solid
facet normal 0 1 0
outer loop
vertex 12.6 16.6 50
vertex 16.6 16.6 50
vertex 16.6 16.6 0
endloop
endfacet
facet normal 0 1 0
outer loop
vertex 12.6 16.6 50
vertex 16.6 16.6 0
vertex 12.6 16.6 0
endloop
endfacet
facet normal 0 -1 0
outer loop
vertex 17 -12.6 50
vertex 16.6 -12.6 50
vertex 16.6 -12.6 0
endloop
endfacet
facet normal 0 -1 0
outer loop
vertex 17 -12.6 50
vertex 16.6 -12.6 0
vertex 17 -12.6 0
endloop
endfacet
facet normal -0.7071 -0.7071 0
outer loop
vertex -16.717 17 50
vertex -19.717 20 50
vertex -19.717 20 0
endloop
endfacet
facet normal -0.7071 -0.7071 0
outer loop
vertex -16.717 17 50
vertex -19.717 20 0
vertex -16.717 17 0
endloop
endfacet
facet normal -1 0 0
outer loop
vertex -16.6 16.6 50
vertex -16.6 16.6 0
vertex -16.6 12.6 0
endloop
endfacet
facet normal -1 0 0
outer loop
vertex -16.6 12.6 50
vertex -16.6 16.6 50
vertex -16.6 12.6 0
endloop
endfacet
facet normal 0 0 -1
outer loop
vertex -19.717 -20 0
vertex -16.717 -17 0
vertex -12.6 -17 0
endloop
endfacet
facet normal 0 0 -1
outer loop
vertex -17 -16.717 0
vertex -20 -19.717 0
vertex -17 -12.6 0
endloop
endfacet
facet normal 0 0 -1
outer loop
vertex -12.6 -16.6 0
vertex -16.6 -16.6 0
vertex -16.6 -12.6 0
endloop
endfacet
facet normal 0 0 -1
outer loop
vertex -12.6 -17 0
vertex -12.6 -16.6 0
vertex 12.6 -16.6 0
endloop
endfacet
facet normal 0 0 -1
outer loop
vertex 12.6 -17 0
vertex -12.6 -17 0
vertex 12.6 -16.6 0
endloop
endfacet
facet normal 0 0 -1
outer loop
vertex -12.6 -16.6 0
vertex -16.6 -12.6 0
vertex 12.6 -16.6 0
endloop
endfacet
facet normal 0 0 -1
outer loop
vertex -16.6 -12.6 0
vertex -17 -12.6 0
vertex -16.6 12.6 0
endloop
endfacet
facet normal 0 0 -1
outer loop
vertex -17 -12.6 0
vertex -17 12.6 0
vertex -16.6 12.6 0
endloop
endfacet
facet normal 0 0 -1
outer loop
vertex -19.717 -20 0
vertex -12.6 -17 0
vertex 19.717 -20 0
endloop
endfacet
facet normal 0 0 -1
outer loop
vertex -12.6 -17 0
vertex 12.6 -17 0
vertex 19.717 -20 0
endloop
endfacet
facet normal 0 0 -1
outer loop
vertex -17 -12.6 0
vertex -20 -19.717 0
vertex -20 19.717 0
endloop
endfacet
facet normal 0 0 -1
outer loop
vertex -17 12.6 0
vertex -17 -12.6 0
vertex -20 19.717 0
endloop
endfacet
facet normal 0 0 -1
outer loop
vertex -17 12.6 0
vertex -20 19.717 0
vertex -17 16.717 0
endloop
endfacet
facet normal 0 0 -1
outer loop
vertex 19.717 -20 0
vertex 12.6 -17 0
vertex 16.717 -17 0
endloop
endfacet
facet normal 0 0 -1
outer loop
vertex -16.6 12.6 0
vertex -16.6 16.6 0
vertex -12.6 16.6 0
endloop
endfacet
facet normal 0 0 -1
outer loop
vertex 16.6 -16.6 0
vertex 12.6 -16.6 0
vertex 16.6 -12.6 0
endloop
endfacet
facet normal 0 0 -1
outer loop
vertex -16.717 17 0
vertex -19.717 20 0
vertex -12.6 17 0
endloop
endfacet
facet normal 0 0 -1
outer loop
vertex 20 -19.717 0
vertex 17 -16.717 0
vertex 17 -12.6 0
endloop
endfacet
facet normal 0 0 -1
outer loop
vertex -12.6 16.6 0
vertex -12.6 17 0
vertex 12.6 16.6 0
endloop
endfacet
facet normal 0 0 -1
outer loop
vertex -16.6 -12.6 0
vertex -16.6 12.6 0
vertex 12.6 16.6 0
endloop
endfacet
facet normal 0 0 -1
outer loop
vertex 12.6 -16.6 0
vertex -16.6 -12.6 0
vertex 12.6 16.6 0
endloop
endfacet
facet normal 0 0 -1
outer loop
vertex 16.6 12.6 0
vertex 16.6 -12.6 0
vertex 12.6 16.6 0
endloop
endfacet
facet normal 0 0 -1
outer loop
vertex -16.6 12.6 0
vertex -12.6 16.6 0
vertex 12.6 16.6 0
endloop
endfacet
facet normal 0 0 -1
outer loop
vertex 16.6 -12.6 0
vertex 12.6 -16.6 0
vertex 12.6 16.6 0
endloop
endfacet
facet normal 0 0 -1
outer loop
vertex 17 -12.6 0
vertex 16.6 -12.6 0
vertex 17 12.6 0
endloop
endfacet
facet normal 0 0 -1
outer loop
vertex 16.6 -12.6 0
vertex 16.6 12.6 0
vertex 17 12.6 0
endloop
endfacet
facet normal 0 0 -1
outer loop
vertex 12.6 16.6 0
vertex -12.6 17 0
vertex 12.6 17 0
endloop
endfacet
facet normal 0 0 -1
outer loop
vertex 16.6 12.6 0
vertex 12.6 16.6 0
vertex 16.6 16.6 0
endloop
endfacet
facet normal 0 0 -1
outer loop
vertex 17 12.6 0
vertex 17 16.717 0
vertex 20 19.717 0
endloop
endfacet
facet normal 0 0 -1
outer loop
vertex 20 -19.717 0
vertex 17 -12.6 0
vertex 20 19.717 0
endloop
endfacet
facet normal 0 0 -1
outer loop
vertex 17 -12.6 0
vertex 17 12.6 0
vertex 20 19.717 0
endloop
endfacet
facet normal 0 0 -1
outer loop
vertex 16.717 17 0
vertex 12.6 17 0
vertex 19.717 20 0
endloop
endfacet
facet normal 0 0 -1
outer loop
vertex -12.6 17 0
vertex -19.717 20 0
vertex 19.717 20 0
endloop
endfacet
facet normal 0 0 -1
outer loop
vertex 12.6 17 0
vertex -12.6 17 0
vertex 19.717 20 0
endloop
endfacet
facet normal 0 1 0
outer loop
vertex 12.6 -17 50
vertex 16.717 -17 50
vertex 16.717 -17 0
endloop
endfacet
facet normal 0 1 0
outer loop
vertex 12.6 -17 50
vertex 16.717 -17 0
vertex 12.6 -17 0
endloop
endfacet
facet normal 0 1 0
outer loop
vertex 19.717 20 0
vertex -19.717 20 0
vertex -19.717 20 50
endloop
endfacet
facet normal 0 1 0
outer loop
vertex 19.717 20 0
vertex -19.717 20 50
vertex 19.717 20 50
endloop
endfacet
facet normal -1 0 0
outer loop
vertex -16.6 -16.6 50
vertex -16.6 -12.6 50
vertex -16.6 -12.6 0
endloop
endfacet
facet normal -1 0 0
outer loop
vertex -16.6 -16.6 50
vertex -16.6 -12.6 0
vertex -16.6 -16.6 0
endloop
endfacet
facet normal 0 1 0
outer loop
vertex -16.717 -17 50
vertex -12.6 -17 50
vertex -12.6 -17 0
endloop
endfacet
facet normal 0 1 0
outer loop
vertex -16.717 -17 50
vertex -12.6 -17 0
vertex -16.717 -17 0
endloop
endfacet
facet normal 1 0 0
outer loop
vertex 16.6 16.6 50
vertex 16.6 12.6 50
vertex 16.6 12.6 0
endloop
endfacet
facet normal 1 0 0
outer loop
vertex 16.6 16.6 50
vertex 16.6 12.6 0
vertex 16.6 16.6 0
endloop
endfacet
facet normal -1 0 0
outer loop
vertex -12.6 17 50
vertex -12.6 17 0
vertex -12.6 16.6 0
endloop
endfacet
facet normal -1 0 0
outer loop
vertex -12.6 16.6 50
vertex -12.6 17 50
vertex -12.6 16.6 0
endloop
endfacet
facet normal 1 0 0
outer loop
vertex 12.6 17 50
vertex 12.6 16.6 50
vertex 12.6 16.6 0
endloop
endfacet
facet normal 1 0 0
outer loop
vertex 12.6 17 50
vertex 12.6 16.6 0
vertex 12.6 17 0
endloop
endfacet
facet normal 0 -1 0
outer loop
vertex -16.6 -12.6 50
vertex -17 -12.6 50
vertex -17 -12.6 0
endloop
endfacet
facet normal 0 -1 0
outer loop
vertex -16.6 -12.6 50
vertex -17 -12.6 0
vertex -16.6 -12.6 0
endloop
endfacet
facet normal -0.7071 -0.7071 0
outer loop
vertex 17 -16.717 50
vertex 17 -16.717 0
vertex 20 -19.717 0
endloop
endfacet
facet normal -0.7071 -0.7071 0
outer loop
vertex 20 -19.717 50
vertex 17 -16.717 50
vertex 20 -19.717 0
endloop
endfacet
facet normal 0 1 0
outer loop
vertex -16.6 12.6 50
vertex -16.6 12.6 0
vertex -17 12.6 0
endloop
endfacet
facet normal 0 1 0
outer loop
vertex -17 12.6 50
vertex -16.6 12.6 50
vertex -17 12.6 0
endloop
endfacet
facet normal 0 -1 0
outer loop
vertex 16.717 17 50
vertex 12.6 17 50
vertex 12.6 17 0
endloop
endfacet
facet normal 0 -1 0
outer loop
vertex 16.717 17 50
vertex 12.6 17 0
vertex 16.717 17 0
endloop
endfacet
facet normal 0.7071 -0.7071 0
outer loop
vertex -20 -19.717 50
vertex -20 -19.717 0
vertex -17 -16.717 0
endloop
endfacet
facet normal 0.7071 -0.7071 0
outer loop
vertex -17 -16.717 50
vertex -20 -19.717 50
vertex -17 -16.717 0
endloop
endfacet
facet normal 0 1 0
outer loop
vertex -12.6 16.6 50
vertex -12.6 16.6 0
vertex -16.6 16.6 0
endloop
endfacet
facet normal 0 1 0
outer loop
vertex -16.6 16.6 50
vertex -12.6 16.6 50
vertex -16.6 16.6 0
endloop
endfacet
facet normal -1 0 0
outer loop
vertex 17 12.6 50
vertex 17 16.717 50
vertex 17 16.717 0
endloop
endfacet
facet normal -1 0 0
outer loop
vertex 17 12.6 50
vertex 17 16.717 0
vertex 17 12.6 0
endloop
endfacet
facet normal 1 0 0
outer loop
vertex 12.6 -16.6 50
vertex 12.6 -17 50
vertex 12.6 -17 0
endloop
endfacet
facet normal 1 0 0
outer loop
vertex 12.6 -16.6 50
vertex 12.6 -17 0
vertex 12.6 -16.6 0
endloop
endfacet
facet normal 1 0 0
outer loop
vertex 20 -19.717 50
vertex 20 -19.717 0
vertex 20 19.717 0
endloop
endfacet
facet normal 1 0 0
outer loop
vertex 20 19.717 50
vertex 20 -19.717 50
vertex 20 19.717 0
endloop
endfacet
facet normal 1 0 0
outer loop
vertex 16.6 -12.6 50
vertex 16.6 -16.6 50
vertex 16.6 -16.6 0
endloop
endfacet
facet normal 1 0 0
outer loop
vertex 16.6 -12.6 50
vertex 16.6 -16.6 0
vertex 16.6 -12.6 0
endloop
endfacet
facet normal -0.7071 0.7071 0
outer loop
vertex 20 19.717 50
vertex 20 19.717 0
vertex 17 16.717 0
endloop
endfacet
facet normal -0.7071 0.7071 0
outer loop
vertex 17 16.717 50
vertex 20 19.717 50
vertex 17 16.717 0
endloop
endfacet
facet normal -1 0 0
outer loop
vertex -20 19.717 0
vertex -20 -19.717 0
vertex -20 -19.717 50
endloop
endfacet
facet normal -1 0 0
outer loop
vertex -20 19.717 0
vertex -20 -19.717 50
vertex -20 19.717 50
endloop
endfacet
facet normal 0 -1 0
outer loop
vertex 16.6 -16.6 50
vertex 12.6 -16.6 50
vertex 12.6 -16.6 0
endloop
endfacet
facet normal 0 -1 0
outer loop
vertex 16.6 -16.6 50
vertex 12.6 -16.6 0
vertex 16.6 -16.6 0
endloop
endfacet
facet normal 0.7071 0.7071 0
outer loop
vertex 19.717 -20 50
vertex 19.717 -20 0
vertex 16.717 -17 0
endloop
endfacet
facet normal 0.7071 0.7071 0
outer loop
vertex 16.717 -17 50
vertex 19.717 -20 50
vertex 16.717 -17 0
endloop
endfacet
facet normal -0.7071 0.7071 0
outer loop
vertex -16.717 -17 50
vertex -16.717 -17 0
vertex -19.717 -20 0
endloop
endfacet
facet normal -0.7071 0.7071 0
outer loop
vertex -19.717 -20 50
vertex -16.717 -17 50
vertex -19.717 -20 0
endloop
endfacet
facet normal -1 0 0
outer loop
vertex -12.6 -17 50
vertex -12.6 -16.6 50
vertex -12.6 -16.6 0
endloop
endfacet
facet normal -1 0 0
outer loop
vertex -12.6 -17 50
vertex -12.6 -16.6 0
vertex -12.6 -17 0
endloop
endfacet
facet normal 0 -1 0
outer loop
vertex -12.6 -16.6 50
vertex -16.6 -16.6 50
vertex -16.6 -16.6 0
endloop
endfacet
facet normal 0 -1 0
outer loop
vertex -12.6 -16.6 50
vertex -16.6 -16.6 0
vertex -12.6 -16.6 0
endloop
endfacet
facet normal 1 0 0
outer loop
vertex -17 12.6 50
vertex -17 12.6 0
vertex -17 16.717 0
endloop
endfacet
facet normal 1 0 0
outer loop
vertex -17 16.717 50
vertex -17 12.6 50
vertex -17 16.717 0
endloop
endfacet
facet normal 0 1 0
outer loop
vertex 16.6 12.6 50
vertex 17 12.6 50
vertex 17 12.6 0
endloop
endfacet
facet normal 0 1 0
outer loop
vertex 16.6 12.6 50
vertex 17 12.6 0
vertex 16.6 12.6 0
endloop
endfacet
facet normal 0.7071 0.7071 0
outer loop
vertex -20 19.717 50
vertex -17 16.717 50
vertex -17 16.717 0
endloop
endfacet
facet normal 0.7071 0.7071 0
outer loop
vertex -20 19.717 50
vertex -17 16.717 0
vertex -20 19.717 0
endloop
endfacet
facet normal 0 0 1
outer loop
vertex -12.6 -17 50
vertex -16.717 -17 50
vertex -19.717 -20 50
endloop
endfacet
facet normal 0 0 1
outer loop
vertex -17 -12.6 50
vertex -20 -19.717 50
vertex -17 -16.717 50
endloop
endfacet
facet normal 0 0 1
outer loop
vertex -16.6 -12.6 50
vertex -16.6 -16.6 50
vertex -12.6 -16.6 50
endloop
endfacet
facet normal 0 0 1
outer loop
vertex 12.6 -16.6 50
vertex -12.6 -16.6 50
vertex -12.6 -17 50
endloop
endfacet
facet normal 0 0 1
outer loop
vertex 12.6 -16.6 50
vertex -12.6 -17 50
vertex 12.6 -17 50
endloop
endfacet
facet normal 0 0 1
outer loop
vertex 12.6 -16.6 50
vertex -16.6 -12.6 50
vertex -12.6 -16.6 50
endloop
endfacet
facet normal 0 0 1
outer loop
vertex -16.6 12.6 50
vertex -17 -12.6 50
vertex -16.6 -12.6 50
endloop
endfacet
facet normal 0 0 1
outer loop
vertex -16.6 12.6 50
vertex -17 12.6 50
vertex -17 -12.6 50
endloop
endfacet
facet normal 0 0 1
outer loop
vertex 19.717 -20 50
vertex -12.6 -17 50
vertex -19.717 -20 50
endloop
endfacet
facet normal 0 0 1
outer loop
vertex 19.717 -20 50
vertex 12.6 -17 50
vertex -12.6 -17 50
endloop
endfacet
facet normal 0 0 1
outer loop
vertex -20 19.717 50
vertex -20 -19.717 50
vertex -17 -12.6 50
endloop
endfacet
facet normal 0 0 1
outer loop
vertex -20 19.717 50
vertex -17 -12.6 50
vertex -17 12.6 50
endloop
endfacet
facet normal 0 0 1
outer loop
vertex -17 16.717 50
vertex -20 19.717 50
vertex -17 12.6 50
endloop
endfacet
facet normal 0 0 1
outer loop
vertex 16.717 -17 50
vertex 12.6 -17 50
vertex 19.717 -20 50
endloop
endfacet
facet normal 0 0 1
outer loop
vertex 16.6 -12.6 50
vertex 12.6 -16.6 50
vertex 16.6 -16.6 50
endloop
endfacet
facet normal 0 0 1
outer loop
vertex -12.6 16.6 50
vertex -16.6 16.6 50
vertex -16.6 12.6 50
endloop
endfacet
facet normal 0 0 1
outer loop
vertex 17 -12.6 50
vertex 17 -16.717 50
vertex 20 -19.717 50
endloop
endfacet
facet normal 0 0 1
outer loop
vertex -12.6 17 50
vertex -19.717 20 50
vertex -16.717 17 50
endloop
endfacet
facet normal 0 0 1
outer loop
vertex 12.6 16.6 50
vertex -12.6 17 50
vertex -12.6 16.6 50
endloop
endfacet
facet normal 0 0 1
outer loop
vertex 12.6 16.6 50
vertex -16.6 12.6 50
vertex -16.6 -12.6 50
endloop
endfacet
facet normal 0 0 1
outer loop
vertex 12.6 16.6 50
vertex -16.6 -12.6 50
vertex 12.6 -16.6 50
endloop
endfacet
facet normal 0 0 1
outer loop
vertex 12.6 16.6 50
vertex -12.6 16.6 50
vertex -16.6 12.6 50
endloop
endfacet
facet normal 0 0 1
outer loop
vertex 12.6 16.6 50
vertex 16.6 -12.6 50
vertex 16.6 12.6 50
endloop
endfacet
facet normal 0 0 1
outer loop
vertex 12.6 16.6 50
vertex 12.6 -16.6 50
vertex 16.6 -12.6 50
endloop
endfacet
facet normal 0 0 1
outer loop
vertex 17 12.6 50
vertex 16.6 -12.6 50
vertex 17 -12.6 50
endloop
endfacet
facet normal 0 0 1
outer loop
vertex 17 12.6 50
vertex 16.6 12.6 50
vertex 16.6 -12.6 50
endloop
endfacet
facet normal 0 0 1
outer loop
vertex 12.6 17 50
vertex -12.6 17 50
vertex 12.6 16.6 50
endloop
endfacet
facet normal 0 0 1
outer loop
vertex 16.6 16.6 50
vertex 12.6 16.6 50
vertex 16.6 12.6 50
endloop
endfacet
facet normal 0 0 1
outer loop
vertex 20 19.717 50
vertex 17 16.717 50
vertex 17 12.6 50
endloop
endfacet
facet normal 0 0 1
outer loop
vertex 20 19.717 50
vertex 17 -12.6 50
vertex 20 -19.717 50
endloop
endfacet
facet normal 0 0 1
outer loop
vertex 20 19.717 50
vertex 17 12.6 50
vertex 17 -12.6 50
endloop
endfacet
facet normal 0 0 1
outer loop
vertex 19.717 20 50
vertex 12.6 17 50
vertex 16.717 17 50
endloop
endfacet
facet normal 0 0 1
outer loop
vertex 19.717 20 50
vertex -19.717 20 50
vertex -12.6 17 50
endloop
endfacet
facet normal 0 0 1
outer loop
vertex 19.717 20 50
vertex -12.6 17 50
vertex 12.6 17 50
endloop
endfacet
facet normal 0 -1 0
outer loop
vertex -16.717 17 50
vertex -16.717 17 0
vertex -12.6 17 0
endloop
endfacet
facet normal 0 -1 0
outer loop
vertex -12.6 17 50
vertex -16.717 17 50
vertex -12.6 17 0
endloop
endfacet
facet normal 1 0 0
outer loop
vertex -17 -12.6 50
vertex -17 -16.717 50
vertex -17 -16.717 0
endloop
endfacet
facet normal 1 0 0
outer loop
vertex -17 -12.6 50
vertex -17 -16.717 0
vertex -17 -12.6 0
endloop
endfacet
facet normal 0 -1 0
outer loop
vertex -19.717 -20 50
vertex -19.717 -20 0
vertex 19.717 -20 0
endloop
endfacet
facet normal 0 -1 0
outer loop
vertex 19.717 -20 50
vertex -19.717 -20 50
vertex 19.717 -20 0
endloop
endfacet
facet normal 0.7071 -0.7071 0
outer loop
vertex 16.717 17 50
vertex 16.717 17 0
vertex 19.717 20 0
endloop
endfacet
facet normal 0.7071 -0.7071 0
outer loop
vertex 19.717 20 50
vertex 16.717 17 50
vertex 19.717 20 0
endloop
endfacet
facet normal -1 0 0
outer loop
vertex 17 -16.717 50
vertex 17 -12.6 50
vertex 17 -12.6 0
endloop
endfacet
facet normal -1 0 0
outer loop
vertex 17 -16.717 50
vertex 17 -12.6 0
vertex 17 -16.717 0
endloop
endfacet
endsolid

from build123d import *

# Parameters (mm, degrees)
SKETCH_W           = 40
SKETCH_H           = 40
PAD_DEPTH          = 50
POCKET_DEPTH       = 150.997689
POCKET_DEPTH_BACK  = 200.997689
POLARPATTERN_COUNT = 4


with BuildPart() as part:
    # Sketch → Pad (new body)
    with BuildSketch(Plane.XY):
        Rectangle(SKETCH_W, SKETCH_H)
    extrude(amount=PAD_DEPTH)

    # Sketch001 → Pocket (cut, two sides)
    with BuildSketch(Plane.XY) as pocket_sk:
        Polygon((-19.717157, 20), (-16.717157, 17), (-12.6, 17), (-12.6, 16.6), (-16.6, 16.6), (-16.6, 12.6), (-17, 12.6), (-17, 16.717157), (-20, 19.717157), (-20, 20), align=None)
    pocket = extrude(amount=-POCKET_DEPTH, mode=Mode.SUBTRACT) + extrude(pocket_sk.sketch, amount=POCKET_DEPTH_BACK, mode=Mode.SUBTRACT)

    # PolarPattern: Pocket ×4 about axis
    polarpattern_axis = Axis((0, 0, 0), (0, 0, 1))
    for i in range(1, POLARPATTERN_COUNT):
        add(pocket.rotate(polarpattern_axis, i * 360 / POLARPATTERN_COUNT), mode=Mode.SUBTRACT)


solid = part.part
